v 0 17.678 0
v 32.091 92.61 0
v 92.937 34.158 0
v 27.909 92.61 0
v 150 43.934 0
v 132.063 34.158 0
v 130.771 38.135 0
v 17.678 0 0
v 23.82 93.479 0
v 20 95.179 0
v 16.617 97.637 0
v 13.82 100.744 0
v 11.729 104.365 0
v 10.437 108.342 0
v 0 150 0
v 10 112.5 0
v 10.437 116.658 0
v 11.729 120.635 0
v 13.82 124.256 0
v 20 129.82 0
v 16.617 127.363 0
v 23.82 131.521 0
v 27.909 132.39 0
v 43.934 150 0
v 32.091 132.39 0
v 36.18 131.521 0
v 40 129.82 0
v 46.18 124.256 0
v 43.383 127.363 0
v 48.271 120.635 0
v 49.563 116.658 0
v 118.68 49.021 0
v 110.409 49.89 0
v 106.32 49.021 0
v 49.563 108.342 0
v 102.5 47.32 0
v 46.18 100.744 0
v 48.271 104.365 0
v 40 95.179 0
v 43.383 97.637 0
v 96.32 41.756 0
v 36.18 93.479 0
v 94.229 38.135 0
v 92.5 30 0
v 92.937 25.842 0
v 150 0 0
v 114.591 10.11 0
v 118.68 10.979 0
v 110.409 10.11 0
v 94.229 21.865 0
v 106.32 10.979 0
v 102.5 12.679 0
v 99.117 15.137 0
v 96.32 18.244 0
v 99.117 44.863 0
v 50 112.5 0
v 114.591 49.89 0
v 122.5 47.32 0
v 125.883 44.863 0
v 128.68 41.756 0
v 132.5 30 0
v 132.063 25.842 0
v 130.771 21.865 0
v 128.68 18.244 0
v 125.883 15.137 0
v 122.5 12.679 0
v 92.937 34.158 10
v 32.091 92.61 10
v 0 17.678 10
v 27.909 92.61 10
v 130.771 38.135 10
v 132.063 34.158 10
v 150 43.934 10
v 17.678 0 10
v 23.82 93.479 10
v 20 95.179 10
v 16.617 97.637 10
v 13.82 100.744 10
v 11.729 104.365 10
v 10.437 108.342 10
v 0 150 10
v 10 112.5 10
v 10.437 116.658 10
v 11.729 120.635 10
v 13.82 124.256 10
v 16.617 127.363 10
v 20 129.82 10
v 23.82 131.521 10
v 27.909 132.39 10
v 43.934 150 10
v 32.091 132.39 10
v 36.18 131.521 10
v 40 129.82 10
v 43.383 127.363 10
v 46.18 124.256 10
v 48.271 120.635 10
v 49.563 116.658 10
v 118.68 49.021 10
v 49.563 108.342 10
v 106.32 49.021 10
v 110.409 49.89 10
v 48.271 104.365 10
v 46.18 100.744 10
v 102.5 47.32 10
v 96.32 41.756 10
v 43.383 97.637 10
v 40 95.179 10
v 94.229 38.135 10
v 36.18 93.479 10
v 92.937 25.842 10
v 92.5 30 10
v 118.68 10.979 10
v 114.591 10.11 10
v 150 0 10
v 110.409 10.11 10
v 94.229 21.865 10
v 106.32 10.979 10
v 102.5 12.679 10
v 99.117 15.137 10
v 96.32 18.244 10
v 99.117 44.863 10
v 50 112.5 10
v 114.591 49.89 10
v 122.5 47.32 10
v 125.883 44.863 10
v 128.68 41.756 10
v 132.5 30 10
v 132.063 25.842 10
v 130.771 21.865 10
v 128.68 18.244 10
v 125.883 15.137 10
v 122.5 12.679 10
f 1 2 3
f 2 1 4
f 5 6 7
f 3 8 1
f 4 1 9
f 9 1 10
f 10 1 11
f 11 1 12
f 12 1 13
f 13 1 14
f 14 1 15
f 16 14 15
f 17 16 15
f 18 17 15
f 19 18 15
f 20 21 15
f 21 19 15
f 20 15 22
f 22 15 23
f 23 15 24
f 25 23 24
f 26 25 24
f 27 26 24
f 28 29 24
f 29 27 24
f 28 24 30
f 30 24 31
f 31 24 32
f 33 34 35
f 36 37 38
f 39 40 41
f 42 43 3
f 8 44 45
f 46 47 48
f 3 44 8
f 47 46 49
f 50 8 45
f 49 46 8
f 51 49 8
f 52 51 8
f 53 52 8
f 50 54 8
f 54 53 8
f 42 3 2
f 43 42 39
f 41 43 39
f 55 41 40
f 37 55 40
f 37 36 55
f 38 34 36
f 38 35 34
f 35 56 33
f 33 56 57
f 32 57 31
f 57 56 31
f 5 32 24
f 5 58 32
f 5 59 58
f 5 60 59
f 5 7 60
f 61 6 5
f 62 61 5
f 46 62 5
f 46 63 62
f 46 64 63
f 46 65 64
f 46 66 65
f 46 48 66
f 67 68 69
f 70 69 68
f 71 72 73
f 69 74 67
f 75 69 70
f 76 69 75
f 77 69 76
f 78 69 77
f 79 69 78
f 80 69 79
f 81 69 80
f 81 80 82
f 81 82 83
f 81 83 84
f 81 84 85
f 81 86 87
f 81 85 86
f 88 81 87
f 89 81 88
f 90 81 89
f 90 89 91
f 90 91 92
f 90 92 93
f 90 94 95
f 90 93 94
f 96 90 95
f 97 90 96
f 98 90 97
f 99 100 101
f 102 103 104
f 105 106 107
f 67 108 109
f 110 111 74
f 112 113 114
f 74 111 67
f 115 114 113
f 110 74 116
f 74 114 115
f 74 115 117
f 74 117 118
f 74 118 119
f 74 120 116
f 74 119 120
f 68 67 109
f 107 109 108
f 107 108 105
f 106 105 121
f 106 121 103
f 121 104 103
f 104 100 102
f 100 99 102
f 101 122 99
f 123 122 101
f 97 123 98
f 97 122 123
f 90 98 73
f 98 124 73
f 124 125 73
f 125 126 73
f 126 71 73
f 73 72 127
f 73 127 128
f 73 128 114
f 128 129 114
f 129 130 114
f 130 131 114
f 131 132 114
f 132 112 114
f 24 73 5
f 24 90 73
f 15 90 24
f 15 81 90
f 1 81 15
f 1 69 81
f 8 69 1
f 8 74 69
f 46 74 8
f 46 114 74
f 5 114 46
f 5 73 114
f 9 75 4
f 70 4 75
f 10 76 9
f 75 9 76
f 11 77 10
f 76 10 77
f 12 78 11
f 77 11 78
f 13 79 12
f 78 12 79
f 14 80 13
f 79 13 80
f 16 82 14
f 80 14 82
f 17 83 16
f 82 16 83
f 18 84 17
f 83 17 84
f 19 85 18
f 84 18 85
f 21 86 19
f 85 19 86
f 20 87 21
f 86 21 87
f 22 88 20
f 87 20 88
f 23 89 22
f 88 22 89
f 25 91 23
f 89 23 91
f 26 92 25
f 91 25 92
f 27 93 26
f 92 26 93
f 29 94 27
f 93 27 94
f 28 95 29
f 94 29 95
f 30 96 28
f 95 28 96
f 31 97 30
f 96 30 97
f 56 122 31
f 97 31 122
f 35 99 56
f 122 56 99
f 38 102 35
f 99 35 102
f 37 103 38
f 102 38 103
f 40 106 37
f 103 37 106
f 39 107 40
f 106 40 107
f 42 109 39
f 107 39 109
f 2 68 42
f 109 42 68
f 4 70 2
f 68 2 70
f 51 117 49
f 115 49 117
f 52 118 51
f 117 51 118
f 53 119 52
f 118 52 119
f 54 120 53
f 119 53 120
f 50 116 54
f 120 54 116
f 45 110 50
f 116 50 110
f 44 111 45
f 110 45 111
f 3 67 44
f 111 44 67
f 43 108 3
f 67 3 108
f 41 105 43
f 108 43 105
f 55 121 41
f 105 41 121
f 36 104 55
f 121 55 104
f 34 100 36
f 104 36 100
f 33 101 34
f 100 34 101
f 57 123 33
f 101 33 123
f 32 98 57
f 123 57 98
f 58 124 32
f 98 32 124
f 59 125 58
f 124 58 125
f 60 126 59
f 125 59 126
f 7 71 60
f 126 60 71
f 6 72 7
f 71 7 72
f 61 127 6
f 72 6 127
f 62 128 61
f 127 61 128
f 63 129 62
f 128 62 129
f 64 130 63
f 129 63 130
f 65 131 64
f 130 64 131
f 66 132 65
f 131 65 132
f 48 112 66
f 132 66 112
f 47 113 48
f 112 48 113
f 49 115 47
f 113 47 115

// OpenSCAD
//Customizable clamping square
//By Iron Momo


/* [Basic] */
square_width = 150;
hole_diameter = 20;

output_type = "STL"; //[DXF,STL]

/* [STL output] */
material_thickness = 10;

/* [Hidden] */
l1 = 3*square_width/4;
l2 = hole_diameter + 10;


// preview[view: north, tilt:top]

if(output_type=="STL")
{linear_extrude(height = material_thickness, center = false) square_creation();
}

if(output_type=="DXF")
{square_creation();}

module square_creation()
{
difference()
{
	square(square_width);	

	translate([square_width,square_width,0])rotate([0,0,-45])square(square_width, center= true);
	rotate([0,0,-45]) square(square_width/6 , center= true);
	translate([l1,l2,0])circle(hole_diameter);
	translate([l2,l1,0])circle(hole_diameter);
	
}
}
